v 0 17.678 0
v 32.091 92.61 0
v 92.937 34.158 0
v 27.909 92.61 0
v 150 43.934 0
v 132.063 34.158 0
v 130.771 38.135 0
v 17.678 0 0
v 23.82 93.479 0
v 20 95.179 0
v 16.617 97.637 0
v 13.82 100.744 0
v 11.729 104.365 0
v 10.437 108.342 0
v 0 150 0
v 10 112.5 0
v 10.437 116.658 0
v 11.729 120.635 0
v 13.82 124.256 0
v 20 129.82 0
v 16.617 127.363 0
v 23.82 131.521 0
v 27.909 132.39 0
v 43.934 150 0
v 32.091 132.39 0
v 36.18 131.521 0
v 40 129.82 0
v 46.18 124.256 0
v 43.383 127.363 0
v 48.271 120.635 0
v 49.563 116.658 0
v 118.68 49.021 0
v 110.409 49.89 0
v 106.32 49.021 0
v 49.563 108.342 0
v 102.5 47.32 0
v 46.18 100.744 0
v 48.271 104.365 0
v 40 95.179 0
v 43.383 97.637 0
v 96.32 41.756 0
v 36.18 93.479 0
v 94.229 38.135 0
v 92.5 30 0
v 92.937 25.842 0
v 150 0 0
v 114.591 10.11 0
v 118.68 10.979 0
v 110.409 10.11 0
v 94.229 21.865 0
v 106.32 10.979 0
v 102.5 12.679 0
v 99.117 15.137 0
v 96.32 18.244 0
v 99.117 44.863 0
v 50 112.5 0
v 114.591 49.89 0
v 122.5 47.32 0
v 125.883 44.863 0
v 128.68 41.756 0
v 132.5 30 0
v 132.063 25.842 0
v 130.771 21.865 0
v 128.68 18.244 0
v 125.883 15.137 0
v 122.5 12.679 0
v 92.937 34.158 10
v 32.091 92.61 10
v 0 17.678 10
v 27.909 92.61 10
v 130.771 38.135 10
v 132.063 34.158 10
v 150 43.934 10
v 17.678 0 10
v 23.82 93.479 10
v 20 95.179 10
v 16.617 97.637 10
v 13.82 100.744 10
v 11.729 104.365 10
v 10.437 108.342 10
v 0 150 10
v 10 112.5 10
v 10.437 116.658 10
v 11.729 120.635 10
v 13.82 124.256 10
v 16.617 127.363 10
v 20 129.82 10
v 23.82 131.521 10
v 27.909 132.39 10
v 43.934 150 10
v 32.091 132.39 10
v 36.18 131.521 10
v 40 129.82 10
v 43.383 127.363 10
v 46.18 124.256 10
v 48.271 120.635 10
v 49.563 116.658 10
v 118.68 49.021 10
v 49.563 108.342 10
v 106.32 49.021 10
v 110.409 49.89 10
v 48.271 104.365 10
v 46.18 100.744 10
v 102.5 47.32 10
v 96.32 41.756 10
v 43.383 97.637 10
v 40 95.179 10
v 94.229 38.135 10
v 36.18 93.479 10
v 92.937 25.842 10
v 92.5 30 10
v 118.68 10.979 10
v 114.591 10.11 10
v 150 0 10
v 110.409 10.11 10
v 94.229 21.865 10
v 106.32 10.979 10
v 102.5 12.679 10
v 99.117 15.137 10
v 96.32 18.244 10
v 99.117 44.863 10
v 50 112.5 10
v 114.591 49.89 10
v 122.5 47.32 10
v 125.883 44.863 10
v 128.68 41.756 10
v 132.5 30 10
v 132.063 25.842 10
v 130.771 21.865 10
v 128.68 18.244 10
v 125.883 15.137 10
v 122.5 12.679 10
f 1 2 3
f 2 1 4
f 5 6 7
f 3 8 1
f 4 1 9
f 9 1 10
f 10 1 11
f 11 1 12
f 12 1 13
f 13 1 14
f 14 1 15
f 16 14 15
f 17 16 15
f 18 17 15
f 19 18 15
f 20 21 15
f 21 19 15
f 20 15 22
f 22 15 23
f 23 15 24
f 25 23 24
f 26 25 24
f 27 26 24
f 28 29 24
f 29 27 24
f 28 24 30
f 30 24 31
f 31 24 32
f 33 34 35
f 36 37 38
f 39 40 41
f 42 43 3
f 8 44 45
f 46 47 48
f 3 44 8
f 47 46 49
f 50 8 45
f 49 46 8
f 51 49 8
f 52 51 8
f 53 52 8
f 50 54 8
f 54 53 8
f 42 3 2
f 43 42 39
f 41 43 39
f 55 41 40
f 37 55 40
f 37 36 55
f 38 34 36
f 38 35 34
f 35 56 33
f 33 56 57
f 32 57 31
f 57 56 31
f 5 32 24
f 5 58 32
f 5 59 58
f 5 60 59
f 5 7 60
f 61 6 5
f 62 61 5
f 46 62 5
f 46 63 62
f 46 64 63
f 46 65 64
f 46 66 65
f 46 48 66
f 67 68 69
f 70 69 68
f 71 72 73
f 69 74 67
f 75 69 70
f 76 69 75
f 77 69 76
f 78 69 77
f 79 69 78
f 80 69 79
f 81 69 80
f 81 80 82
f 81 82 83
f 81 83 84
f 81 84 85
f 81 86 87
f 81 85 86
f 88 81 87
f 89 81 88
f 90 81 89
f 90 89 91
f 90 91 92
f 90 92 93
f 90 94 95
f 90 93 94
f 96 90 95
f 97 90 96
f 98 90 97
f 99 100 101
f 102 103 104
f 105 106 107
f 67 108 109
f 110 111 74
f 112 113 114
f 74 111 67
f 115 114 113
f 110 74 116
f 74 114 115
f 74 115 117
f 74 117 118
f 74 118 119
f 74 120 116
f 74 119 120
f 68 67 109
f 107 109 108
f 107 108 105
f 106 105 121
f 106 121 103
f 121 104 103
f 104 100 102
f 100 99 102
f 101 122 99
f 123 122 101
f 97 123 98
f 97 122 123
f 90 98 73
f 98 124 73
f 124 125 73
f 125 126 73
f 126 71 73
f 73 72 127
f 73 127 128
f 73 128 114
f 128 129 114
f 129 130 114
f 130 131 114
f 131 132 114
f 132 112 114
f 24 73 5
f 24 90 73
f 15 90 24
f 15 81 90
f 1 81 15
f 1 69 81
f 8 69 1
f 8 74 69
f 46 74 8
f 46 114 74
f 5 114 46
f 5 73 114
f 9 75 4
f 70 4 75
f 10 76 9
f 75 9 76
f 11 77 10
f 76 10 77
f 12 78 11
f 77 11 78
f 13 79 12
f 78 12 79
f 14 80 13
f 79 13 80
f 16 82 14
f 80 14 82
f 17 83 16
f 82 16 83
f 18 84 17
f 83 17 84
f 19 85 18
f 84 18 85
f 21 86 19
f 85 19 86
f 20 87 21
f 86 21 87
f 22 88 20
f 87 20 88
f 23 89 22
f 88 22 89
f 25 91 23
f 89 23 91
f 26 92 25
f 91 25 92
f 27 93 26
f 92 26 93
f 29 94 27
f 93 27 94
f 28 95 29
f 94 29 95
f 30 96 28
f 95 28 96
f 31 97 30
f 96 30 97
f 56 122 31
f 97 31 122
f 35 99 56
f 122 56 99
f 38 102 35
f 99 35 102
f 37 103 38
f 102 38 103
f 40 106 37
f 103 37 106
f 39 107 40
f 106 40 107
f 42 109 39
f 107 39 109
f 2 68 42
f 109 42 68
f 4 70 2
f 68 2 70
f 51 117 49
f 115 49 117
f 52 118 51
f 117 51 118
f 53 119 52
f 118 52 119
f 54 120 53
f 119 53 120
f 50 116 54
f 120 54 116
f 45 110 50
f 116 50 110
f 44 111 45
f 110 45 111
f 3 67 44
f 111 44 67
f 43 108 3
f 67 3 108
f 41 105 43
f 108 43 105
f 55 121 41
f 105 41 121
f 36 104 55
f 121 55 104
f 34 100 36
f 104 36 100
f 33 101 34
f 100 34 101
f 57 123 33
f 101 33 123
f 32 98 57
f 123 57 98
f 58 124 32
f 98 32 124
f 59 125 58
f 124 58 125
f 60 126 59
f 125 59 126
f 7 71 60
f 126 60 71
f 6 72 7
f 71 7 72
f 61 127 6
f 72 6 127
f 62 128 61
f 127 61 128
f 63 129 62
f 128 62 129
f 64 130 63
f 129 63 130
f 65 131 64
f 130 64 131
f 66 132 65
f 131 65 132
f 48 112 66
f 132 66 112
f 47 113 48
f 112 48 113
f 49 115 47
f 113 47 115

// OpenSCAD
//Customizable clamping square
//By Iron Momo


/* [Basic] */
square_width = 150;
hole_diameter = 20;

output_type = "STL"; //[DXF,STL]

/* [STL output] */
material_thickness = 10;

/* [Hidden] */
l1 = 3*square_width/4;
l2 = hole_diameter + 10;


// preview[view: north, tilt:top]

if(output_type=="STL")
{linear_extrude(height = material_thickness, center = false) square_creation();
}

if(output_type=="DXF")
{square_creation();}

module square_creation()
{
difference()
{
	square(square_width);	

	translate([square_width,square_width,0])rotate([0,0,-45])square(square_width, center= true);
	rotate([0,0,-45]) square(square_width/6 , center= true);
	translate([l1,l2,0])circle(hole_diameter);
	translate([l2,l1,0])circle(hole_diameter);
	
}
}
